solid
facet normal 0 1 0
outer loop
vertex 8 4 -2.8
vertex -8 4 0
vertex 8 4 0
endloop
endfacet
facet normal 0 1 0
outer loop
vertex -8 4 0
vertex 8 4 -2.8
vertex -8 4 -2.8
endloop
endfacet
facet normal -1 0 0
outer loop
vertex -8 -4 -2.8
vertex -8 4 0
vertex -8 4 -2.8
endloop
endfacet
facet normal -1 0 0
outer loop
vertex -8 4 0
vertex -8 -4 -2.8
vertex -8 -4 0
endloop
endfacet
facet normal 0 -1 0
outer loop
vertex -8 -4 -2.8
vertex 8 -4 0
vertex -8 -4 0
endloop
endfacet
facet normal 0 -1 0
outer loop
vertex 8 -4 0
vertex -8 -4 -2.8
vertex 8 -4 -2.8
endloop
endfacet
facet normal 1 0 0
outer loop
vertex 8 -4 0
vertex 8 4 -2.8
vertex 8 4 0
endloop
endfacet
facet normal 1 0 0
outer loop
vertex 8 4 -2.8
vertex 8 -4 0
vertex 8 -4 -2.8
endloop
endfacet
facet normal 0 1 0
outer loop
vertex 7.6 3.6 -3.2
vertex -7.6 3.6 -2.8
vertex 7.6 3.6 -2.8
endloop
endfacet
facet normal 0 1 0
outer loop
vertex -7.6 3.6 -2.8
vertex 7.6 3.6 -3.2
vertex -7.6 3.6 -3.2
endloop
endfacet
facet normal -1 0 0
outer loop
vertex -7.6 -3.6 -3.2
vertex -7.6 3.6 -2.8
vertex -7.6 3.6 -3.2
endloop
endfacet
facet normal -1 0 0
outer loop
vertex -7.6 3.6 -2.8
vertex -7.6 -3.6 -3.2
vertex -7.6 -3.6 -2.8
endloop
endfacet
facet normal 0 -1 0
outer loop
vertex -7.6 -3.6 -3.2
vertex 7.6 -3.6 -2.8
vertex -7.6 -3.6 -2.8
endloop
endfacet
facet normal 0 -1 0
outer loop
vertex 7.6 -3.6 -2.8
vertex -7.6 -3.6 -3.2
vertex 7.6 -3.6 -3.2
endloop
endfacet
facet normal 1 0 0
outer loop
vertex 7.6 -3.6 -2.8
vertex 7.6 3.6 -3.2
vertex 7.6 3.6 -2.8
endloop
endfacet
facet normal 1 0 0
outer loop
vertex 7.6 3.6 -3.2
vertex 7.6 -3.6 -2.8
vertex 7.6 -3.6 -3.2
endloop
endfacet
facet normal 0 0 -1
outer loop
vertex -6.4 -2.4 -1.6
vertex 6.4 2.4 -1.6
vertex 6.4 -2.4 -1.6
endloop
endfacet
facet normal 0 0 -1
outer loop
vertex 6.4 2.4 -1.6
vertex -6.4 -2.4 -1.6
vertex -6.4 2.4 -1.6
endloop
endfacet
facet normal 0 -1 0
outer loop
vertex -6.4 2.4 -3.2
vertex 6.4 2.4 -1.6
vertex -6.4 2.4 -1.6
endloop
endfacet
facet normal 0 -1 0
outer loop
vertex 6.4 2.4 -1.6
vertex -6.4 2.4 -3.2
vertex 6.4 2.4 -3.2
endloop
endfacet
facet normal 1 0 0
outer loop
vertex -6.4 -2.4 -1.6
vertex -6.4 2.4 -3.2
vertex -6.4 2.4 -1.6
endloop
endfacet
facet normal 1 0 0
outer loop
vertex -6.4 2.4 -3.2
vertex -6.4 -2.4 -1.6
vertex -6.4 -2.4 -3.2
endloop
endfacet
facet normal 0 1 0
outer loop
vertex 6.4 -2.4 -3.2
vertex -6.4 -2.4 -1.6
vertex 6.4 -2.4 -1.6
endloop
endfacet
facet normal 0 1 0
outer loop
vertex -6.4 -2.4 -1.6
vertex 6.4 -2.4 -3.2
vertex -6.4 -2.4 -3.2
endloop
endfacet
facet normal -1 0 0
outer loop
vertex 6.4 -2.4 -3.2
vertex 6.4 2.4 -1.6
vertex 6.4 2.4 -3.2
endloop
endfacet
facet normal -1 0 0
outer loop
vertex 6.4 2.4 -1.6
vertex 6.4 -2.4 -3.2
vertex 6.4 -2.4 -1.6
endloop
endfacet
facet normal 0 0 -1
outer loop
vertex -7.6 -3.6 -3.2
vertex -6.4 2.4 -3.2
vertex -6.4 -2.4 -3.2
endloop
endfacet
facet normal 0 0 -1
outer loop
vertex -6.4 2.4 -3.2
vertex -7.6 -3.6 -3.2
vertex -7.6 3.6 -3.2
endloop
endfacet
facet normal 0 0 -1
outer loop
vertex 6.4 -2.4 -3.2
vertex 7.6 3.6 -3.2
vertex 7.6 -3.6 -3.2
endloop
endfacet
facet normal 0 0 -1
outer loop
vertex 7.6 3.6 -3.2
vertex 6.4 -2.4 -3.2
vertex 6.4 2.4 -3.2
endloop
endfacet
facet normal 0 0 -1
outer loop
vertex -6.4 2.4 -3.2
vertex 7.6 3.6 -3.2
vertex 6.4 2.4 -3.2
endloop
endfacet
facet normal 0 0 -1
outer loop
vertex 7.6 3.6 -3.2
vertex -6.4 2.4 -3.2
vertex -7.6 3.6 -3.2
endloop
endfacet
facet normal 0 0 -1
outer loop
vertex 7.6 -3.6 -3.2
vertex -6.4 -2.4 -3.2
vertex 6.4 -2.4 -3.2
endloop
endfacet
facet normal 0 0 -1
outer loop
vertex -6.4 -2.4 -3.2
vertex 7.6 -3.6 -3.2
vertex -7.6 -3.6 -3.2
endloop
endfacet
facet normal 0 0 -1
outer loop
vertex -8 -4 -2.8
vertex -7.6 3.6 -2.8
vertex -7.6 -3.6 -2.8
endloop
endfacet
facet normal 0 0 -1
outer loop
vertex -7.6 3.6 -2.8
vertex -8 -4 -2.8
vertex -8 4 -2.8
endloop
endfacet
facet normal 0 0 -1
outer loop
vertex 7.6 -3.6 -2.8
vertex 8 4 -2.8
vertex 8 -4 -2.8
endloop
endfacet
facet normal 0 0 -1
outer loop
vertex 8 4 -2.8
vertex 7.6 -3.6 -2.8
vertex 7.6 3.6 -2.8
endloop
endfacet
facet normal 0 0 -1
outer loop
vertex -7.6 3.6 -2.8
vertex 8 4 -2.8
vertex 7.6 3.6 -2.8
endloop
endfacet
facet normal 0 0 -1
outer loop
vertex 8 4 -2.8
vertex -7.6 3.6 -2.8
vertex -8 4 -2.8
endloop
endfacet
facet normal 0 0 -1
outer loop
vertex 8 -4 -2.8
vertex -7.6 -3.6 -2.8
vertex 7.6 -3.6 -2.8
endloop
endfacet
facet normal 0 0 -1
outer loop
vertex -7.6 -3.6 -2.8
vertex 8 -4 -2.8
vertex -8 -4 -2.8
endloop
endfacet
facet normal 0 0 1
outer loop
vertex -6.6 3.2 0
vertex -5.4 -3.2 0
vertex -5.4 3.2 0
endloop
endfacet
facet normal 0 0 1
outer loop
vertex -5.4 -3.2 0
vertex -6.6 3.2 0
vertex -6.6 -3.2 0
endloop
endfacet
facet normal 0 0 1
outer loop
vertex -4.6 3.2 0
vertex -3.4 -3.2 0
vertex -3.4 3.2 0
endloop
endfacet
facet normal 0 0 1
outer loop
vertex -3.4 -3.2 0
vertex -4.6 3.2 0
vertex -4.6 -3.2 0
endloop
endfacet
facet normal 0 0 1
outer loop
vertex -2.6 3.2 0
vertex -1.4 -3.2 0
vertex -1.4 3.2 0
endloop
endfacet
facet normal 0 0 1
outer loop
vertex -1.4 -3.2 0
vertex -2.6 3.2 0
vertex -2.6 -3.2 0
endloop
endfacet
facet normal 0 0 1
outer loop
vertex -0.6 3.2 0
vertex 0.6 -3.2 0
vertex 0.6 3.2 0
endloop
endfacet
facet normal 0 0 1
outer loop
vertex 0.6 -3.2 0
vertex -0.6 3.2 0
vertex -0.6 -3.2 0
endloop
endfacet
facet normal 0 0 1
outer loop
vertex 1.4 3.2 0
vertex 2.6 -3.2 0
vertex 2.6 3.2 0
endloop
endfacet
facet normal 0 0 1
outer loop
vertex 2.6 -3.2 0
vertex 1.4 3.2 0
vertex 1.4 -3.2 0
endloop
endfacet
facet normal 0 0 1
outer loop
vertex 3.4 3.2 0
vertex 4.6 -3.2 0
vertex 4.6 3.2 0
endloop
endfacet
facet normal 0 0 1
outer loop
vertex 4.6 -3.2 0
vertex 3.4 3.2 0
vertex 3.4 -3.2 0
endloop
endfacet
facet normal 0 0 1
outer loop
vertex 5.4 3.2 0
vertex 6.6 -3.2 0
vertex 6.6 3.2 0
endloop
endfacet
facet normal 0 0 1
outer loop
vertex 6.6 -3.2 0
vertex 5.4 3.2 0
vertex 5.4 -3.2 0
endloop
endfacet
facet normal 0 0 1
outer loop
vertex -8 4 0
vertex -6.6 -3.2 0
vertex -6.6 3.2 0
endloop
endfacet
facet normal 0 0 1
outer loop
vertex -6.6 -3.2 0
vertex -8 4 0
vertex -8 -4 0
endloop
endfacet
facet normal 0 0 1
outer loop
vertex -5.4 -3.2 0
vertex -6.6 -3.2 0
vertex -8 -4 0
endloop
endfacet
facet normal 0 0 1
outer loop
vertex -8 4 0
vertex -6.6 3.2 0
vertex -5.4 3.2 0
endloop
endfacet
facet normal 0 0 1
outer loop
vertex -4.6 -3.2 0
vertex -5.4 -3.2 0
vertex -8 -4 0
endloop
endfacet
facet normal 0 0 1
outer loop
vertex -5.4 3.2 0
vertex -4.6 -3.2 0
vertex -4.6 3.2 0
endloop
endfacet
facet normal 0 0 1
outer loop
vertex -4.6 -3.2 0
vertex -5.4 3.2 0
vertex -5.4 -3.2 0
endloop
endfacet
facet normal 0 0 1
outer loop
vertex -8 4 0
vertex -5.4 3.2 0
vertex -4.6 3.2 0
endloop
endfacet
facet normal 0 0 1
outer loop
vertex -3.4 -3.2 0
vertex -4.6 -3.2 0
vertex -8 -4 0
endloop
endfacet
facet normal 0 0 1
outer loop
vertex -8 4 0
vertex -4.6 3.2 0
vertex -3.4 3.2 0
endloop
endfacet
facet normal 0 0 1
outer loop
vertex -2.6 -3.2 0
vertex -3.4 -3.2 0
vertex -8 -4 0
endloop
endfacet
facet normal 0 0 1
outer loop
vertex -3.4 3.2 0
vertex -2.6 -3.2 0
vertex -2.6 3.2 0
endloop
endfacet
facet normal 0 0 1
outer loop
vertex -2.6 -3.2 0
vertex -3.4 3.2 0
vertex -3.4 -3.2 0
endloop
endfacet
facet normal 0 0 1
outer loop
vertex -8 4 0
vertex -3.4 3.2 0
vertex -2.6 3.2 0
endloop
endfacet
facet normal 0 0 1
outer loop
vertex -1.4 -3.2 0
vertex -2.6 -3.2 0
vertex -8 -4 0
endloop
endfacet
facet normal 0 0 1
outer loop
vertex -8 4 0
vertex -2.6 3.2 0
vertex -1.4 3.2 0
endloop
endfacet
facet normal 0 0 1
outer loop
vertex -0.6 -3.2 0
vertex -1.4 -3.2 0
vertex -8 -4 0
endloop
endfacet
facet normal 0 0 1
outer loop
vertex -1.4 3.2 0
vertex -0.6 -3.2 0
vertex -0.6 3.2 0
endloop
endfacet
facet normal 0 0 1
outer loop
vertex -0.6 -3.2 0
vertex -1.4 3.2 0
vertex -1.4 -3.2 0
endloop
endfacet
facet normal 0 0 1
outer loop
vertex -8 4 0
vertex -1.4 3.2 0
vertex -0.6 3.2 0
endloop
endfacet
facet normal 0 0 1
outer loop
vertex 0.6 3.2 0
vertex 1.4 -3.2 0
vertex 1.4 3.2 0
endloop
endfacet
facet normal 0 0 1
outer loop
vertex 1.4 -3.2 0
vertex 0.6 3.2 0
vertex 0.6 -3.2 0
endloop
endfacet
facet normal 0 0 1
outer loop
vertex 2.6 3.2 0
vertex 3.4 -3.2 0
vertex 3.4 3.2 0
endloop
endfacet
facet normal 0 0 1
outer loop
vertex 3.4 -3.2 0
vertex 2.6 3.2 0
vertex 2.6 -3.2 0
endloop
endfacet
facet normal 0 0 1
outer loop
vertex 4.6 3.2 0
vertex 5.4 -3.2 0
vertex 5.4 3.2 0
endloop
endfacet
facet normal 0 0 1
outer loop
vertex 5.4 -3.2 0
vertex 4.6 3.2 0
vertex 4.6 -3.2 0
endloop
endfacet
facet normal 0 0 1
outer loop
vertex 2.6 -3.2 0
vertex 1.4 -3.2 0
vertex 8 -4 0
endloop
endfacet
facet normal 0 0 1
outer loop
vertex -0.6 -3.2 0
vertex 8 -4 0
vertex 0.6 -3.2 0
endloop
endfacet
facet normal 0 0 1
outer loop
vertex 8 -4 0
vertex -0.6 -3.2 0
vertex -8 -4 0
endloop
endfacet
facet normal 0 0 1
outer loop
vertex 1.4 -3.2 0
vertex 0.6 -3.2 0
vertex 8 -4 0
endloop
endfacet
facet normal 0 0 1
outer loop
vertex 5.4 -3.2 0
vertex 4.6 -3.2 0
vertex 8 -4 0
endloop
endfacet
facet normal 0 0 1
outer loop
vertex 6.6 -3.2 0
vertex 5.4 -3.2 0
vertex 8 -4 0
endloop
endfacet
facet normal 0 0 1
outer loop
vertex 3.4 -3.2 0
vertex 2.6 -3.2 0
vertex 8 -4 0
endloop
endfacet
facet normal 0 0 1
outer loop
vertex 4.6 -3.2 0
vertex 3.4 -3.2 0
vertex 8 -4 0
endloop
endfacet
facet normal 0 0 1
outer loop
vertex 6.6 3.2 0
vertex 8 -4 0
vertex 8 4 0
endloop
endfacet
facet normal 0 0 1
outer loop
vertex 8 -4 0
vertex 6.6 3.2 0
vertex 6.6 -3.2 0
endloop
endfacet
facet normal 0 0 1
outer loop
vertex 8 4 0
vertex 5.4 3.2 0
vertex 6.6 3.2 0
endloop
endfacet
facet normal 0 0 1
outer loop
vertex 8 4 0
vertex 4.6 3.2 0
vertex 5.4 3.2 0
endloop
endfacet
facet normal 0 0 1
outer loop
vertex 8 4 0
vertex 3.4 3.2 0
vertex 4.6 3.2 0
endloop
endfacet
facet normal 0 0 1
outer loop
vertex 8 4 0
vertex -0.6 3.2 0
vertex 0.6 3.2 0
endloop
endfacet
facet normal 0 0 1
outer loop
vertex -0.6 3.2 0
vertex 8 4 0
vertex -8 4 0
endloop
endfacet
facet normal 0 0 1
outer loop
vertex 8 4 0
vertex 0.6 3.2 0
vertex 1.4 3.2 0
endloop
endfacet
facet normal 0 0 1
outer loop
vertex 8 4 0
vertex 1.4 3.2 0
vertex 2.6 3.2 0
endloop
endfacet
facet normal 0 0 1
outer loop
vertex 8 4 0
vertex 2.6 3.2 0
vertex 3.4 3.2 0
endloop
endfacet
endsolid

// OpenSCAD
// file: ../p/box5.scad
use <../lib.scad>
function ldraw_lib__box5() = [
// 0 Box with 5 Faces and All Edges
// 0 Name: box5.dat
// 0 Author: James Jessiman
// 0 !LDRAW_ORG Primitive UPDATE 2012-01
// 0 !LICENSE Licensed under CC BY 2.0 and CC BY 4.0 : see CAreadme.txt
// 
// 0 BFC CERTIFY CCW
  [0,"BFC","CERTIFY"],
  [0,"BFC","CCW"],
// 
// 0 !HISTORY 2002-04-03 [sbliss] Modified for BFC compliance
// 0 !HISTORY 2002-04-25 [PTadmin] Official Update 2002-02
// 0 !HISTORY 2007-06-24 [PTadmin] Header formatted for Contributor Agreement
// 0 !HISTORY 2008-07-01 [PTadmin] Official Update 2008-01
// 0 !HISTORY 2012-02-16 [Philo] Changed to CCW
// 0 !HISTORY 2012-03-30 [PTadmin] Official Update 2012-01
// 
// 
// 2 24 1 1 1 -1 1 1
  [2,24,1,1,1,-1,1,1],
// 2 24 -1 1 1 -1 1 -1
  [2,24,-1,1,1,-1,1,-1],
// 2 24 -1 1 -1 1 1 -1
  [2,24,-1,1,-1,1,1,-1],
// 2 24 1 1 -1 1 1 1
  [2,24,1,1,-1,1,1,1],
// 2 24 1 0 1 -1 0 1
  [2,24,1,0,1,-1,0,1],
// 2 24 -1 0 1 -1 0 -1
  [2,24,-1,0,1,-1,0,-1],
// 2 24 -1 0 -1 1 0 -1
  [2,24,-1,0,-1,1,0,-1],
// 2 24 1 0 -1 1 0 1
  [2,24,1,0,-1,1,0,1],
// 2 24 1 0 1 1 1 1
  [2,24,1,0,1,1,1,1],
// 2 24 -1 0 1 -1 1 1
  [2,24,-1,0,1,-1,1,1],
// 2 24 1 0 -1 1 1 -1
  [2,24,1,0,-1,1,1,-1],
// 2 24 -1 0 -1 -1 1 -1
  [2,24,-1,0,-1,-1,1,-1],
// 4 16 -1 1 1 1 1 1 1 1 -1 -1 1 -1
  [4,16,-1,1,1,1,1,1,1,1,-1,-1,1,-1],
// 4 16 -1 1 1 -1 0 1 1 0 1 1 1 1
  [4,16,-1,1,1,-1,0,1,1,0,1,1,1,1],
// 4 16 -1 1 -1 -1 0 -1 -1 0 1 -1 1 1
  [4,16,-1,1,-1,-1,0,-1,-1,0,1,-1,1,1],
// 4 16 1 1 -1 1 0 -1 -1 0 -1 -1 1 -1
  [4,16,1,1,-1,1,0,-1,-1,0,-1,-1,1,-1],
// 4 16 1 1 1 1 0 1 1 0 -1 1 1 -1
  [4,16,1,1,1,1,0,1,1,0,-1,1,1,-1],
];
module ldraw_lib__box5(step=0, col=false, unit=2/5, alt=false, line=0.2, solid=!$preview)
    makepoly(ldraw_lib__box5(), step=step, col=col, unit=unit, alt=alt, line=line, solid=solid);
ldraw_lib__box5(line=0.2);
// file: ../p/box4.scad
use <../lib.scad>
function ldraw_lib__box4() = [
// 0 Box with 4 Faces (2 Parallel Pairs) and All Edges
// 0 Name: box4.dat
// 0 Author: James Jessiman
// 0 !LDRAW_ORG Primitive UPDATE 2012-01
// 0 !LICENSE Licensed under CC BY 2.0 and CC BY 4.0 : see CAreadme.txt
// 
// 0 BFC CERTIFY CCW
  [0,"BFC","CERTIFY"],
  [0,"BFC","CCW"],
// 
// 0 !HISTORY 2002-04-03 [sbliss] Modified for BFC compliance
// 0 !HISTORY 2002-04-25 [PTadmin] Official Update 2002-02
// 0 !HISTORY 2007-06-24 [PTadmin] Header formatted for Contributor Agreement
// 0 !HISTORY 2008-07-01 [PTadmin] Official Update 2008-01
// 0 !HISTORY 2012-02-16 [Philo] Changed to CCW
// 0 !HISTORY 2012-03-30 [PTadmin] Official Update 2012-01
// 
// 
// 2 24 1 1 1 -1 1 1
  [2,24,1,1,1,-1,1,1],
// 2 24 -1 1 1 -1 1 -1
  [2,24,-1,1,1,-1,1,-1],
// 2 24 -1 1 -1 1 1 -1
  [2,24,-1,1,-1,1,1,-1],
// 2 24 1 1 -1 1 1 1
  [2,24,1,1,-1,1,1,1],
// 2 24 1 0 1 -1 0 1
  [2,24,1,0,1,-1,0,1],
// 2 24 -1 0 1 -1 0 -1
  [2,24,-1,0,1,-1,0,-1],
// 2 24 -1 0 -1 1 0 -1
  [2,24,-1,0,-1,1,0,-1],
// 2 24 1 0 -1 1 0 1
  [2,24,1,0,-1,1,0,1],
// 2 24 1 0 1 1 1 1
  [2,24,1,0,1,1,1,1],
// 2 24 -1 0 1 -1 1 1
  [2,24,-1,0,1,-1,1,1],
// 2 24 1 0 -1 1 1 -1
  [2,24,1,0,-1,1,1,-1],
// 2 24 -1 0 -1 -1 1 -1
  [2,24,-1,0,-1,-1,1,-1],
// 4 16 -1 1 1 -1 0 1 1 0 1 1 1 1
  [4,16,-1,1,1,-1,0,1,1,0,1,1,1,1],
// 4 16 -1 1 -1 -1 0 -1 -1 0 1 -1 1 1
  [4,16,-1,1,-1,-1,0,-1,-1,0,1,-1,1,1],
// 4 16 1 1 -1 1 0 -1 -1 0 -1 -1 1 -1
  [4,16,1,1,-1,1,0,-1,-1,0,-1,-1,1,-1],
// 4 16 1 1 1 1 0 1 1 0 -1 1 1 -1
  [4,16,1,1,1,1,0,1,1,0,-1,1,1,-1],
];
module ldraw_lib__box4(step=0, col=false, unit=2/5, alt=false, line=0.2, solid=!$preview)
    makepoly(ldraw_lib__box4(), step=step, col=col, unit=unit, alt=alt, line=line, solid=solid);
ldraw_lib__box4(line=0.2);
// file: s/3069bs01.scad
use <../../lib.scad>
use <../../p/box4.scad>
use <../../p/box5.scad>
function ldraw_lib__s__3069bs01() = [
// 0 ~Tile  1 x  2 with Groove without Top Face
// 0 Name: s\3069bs01.dat
// 0 Author: Santeri Piippo [arezey]
// 0 !LDRAW_ORG Subpart UPDATE 2010-02
// 0 !LICENSE Licensed under CC BY 2.0 and CC BY 4.0 : see CAreadme.txt
// 
// 0 BFC CERTIFY CCW
  [0,"BFC","CERTIFY"],
  [0,"BFC","CCW"],
// 
// 0 !HISTORY 2010-07-05 [PTadmin] Official Update 2010-02
// 
// 
// 1 16 0 0 0 20 0 0 0 7 0 0 0 10 box4.dat
  [1,16,0,0,0,20,0,0,0,7,0,0,0,10, ldraw_lib__box4()],
// 1 16 0 7 0 19 0 0 0 1 0 0 0 9 box4.dat
  [1,16,0,7,0,19,0,0,0,1,0,0,0,9, ldraw_lib__box4()],
// 0 BFC INVERTNEXT
  [0,"BFC","INVERTNEXT"],
// 1 16 0 8 0 16 0 0 0 -4 0 0 0 6 box5.dat
  [1,16,0,8,0,16,0,0,0,-4,0,0,0,6, ldraw_lib__box5()],
// 4 16 -19 8 9 -16 8 6 -16 8 -6 -19 8 -9
  [4,16,-19,8,9,-16,8,6,-16,8,-6,-19,8,-9],
// 4 16 19 8 -9 16 8 -6 16 8 6 19 8 9
  [4,16,19,8,-9,16,8,-6,16,8,6,19,8,9],
// 4 16 19 8 9 16 8 6 -16 8 6 -19 8 9
  [4,16,19,8,9,16,8,6,-16,8,6,-19,8,9],
// 4 16 -19 8 -9 -16 8 -6 16 8 -6 19 8 -9
  [4,16,-19,8,-9,-16,8,-6,16,8,-6,19,8,-9],
// 4 16 -20 7 10 -19 7 9 -19 7 -9 -20 7 -10
  [4,16,-20,7,10,-19,7,9,-19,7,-9,-20,7,-10],
// 4 16 20 7 -10 19 7 -9 19 7 9 20 7 10
  [4,16,20,7,-10,19,7,-9,19,7,9,20,7,10],
// 4 16 20 7 10 19 7 9 -19 7 9 -20 7 10
  [4,16,20,7,10,19,7,9,-19,7,9,-20,7,10],
// 4 16 -20 7 -10 -19 7 -9 19 7 -9 20 7 -10
  [4,16,-20,7,-10,-19,7,-9,19,7,-9,20,7,-10],
// 0 //
];
module ldraw_lib__s__3069bs01(step=0, col=false, unit=2/5, alt=false, line=0.2, solid=!$preview)
    makepoly(ldraw_lib__s__3069bs01(), step=step, col=col, unit=unit, alt=alt, line=line, solid=solid);
ldraw_lib__s__3069bs01(line=0.2);
// file: 3069bp05.scad
use <../lib.scad>
use <s/3069bs01.scad>
function ldraw_lib__3069bp05() = [
// 0 Tile  1 x  2 with Black Grille with  7 Stripes Pattern
// 0 Name: 3069bp05.dat
// 0 Author: James Jessiman
// 0 !LDRAW_ORG Part UPDATE 2019-02
// 0 !LICENSE Licensed under CC BY 2.0 and CC BY 4.0 : see CAreadme.txt
// 
// 0 BFC CERTIFY CCW
  [0,"BFC","CERTIFY"],
  [0,"BFC","CCW"],
// 
// 0 !HISTORY 2002-02-18 [PTadmin] Official Update 2002-01
// 0 !HISTORY 2003-06-06 [jriley] BFC compliancy
// 0 !HISTORY 2003-12-19 [PTadmin] Official Update 2003-03
// 0 !HISTORY 2007-06-13 [PTadmin] Header formatted for Contributor Agreement
// 0 !HISTORY 2008-07-01 [PTadmin] Official Update 2008-01
// 0 !HISTORY 2009-08-13 [anathema] Removed edge-lines from pattern
// 0 !HISTORY 2009-12-29 [PTadmin] Official Update 2009-03
// 0 !HISTORY 2019-06-20 [Darats] Changed description, Removed T-junctions
// 0 !HISTORY 2019-09-09 [PTadmin] Official Update 2019-02
// 
// 
// 1 16 0 0 0 1 0 0 0 1 0 0 0 1 s\3069bs01.dat
  [1,16,0,0,0,1,0,0,0,1,0,0,0,1, ldraw_lib__s__3069bs01()],
// 4 0 -16.5 0 8 -16.5 0 -8 -13.5 0 -8 -13.5 0 8
  [4,0,-16.5,0,8,-16.5,0,-8,-13.5,0,-8,-13.5,0,8],
// 4 0 -11.5 0 8 -11.5 0 -8 -8.5 0 -8 -8.5 0 8
  [4,0,-11.5,0,8,-11.5,0,-8,-8.5,0,-8,-8.5,0,8],
// 4 0 -6.5 0 8 -6.5 0 -8 -3.5 0 -8 -3.5 0 8
  [4,0,-6.5,0,8,-6.5,0,-8,-3.5,0,-8,-3.5,0,8],
// 4 0 -1.5 0 8 -1.5 0 -8 1.5 0 -8 1.5 0 8
  [4,0,-1.5,0,8,-1.5,0,-8,1.5,0,-8,1.5,0,8],
// 4 0 3.5 0 8 3.5 0 -8 6.5 0 -8 6.5 0 8
  [4,0,3.5,0,8,3.5,0,-8,6.5,0,-8,6.5,0,8],
// 4 0 8.5 0 8 8.5 0 -8 11.5 0 -8 11.5 0 8
  [4,0,8.5,0,8,8.5,0,-8,11.5,0,-8,11.5,0,8],
// 4 0 13.5 0 8 13.5 0 -8 16.5 0 -8 16.5 0 8
  [4,0,13.5,0,8,13.5,0,-8,16.5,0,-8,16.5,0,8],
// 4 16 -20 0 -10 -16.5 0 -8 -16.5 0 8 -20 0 10
  [4,16,-20,0,-10,-16.5,0,-8,-16.5,0,8,-20,0,10],
// 3 16 -13.5 0 -8 -16.5 0 -8 -20 0 -10
  [3,16,-13.5,0,-8,-16.5,0,-8,-20,0,-10],
// 3 16 -20 0 10 -16.5 0 8 -13.5 0 8
  [3,16,-20,0,10,-16.5,0,8,-13.5,0,8],
// 3 16 -11.5 0 -8 -13.5 0 -8 -20 0 -10
  [3,16,-11.5,0,-8,-13.5,0,-8,-20,0,-10],
// 4 16 -13.5 0 8 -13.5 0 -8 -11.5 0 -8 -11.5 0 8
  [4,16,-13.5,0,8,-13.5,0,-8,-11.5,0,-8,-11.5,0,8],
// 3 16 -20 0 10 -13.5 0 8 -11.5 0 8
  [3,16,-20,0,10,-13.5,0,8,-11.5,0,8],
// 3 16 -8.5 0 -8 -11.5 0 -8 -20 0 -10
  [3,16,-8.5,0,-8,-11.5,0,-8,-20,0,-10],
// 3 16 -20 0 10 -11.5 0 8 -8.5 0 8
  [3,16,-20,0,10,-11.5,0,8,-8.5,0,8],
// 3 16 -6.5 0 -8 -8.5 0 -8 -20 0 -10
  [3,16,-6.5,0,-8,-8.5,0,-8,-20,0,-10],
// 4 16 -8.5 0 8 -8.5 0 -8 -6.5 0 -8 -6.5 0 8
  [4,16,-8.5,0,8,-8.5,0,-8,-6.5,0,-8,-6.5,0,8],
// 3 16 -20 0 10 -8.5 0 8 -6.5 0 8
  [3,16,-20,0,10,-8.5,0,8,-6.5,0,8],
// 3 16 -3.5 0 -8 -6.5 0 -8 -20 0 -10
  [3,16,-3.5,0,-8,-6.5,0,-8,-20,0,-10],
// 3 16 -20 0 10 -6.5 0 8 -3.5 0 8
  [3,16,-20,0,10,-6.5,0,8,-3.5,0,8],
// 3 16 -1.5 0 -8 -3.5 0 -8 -20 0 -10
  [3,16,-1.5,0,-8,-3.5,0,-8,-20,0,-10],
// 4 16 -3.5 0 8 -3.5 0 -8 -1.5 0 -8 -1.5 0 8
  [4,16,-3.5,0,8,-3.5,0,-8,-1.5,0,-8,-1.5,0,8],
// 3 16 -20 0 10 -3.5 0 8 -1.5 0 8
  [3,16,-20,0,10,-3.5,0,8,-1.5,0,8],
// 4 16 1.5 0 8 1.5 0 -8 3.5 0 -8 3.5 0 8
  [4,16,1.5,0,8,1.5,0,-8,3.5,0,-8,3.5,0,8],
// 4 16 6.5 0 8 6.5 0 -8 8.5 0 -8 8.5 0 8
  [4,16,6.5,0,8,6.5,0,-8,8.5,0,-8,8.5,0,8],
// 4 16 11.5 0 8 11.5 0 -8 13.5 0 -8 13.5 0 8
  [4,16,11.5,0,8,11.5,0,-8,13.5,0,-8,13.5,0,8],
// 3 16 6.5 0 -8 3.5 0 -8 20 0 -10
  [3,16,6.5,0,-8,3.5,0,-8,20,0,-10],
// 4 16 1.5 0 -8 -1.5 0 -8 -20 0 -10 20 0 -10
  [4,16,1.5,0,-8,-1.5,0,-8,-20,0,-10,20,0,-10],
// 3 16 3.5 0 -8 1.5 0 -8 20 0 -10
  [3,16,3.5,0,-8,1.5,0,-8,20,0,-10],
// 3 16 13.5 0 -8 11.5 0 -8 20 0 -10
  [3,16,13.5,0,-8,11.5,0,-8,20,0,-10],
// 3 16 16.5 0 -8 13.5 0 -8 20 0 -10
  [3,16,16.5,0,-8,13.5,0,-8,20,0,-10],
// 3 16 8.5 0 -8 6.5 0 -8 20 0 -10
  [3,16,8.5,0,-8,6.5,0,-8,20,0,-10],
// 3 16 11.5 0 -8 8.5 0 -8 20 0 -10
  [3,16,11.5,0,-8,8.5,0,-8,20,0,-10],
// 4 16 20 0 10 16.5 0 8 16.5 0 -8 20 0 -10
  [4,16,20,0,10,16.5,0,8,16.5,0,-8,20,0,-10],
// 3 16 20 0 10 13.5 0 8 16.5 0 8
  [3,16,20,0,10,13.5,0,8,16.5,0,8],
// 3 16 20 0 10 11.5 0 8 13.5 0 8
  [3,16,20,0,10,11.5,0,8,13.5,0,8],
// 3 16 20 0 10 8.5 0 8 11.5 0 8
  [3,16,20,0,10,8.5,0,8,11.5,0,8],
// 4 16 -20 0 10 -1.5 0 8 1.5 0 8 20 0 10
  [4,16,-20,0,10,-1.5,0,8,1.5,0,8,20,0,10],
// 3 16 20 0 10 1.5 0 8 3.5 0 8
  [3,16,20,0,10,1.5,0,8,3.5,0,8],
// 3 16 20 0 10 3.5 0 8 6.5 0 8
  [3,16,20,0,10,3.5,0,8,6.5,0,8],
// 3 16 20 0 10 6.5 0 8 8.5 0 8
  [3,16,20,0,10,6.5,0,8,8.5,0,8],
];
module ldraw_lib__3069bp05(step=0, col=false, unit=2/5, alt=false, line=0.2, solid=!$preview)
    makepoly(ldraw_lib__3069bp05(), step=step, col=col, unit=unit, alt=alt, line=line, solid=solid);
ldraw_lib__3069bp05(line=0.2);
// main file
use <../lib.scad>
use <3069bp05.scad>
function ldraw_lib__3069p05() = [
// 0 ~Moved to 3069bp05
// 0 Name: 3069p05.dat
// 0 Author: [PTadmin]
// 0 !LDRAW_ORG Part UPDATE 2002-01
// 0 !LICENSE Licensed under CC BY 4.0 : see CAreadme.txt
// 
// 0 BFC CERTIFY CCW
  [0,"BFC","CERTIFY"],
  [0,"BFC","CCW"],
// 
// 0 !HISTORY 2002-02-18 [PTadmin] Official Update 2002-01
// 0 !HISTORY 2007-06-13 [PTadmin] Header formatted for Contributor Agreement
// 0 !HISTORY 2008-07-01 [PTadmin] Official Update 2008-01
// 
// 
// 1 16 0 0 0 1 0 0 0 1 0 0 0 1 3069bp05.dat
  [1,16,0,0,0,1,0,0,0,1,0,0,0,1, ldraw_lib__3069bp05()],
];
module ldraw_lib__3069p05(step=0, col=false, unit=2/5, alt=false, line=0.2, solid=!$preview)
    makepoly(ldraw_lib__3069p05(), step=step, col=col, unit=unit, alt=alt, line=line, solid=solid);
ldraw_lib__3069p05(line=0.2);
